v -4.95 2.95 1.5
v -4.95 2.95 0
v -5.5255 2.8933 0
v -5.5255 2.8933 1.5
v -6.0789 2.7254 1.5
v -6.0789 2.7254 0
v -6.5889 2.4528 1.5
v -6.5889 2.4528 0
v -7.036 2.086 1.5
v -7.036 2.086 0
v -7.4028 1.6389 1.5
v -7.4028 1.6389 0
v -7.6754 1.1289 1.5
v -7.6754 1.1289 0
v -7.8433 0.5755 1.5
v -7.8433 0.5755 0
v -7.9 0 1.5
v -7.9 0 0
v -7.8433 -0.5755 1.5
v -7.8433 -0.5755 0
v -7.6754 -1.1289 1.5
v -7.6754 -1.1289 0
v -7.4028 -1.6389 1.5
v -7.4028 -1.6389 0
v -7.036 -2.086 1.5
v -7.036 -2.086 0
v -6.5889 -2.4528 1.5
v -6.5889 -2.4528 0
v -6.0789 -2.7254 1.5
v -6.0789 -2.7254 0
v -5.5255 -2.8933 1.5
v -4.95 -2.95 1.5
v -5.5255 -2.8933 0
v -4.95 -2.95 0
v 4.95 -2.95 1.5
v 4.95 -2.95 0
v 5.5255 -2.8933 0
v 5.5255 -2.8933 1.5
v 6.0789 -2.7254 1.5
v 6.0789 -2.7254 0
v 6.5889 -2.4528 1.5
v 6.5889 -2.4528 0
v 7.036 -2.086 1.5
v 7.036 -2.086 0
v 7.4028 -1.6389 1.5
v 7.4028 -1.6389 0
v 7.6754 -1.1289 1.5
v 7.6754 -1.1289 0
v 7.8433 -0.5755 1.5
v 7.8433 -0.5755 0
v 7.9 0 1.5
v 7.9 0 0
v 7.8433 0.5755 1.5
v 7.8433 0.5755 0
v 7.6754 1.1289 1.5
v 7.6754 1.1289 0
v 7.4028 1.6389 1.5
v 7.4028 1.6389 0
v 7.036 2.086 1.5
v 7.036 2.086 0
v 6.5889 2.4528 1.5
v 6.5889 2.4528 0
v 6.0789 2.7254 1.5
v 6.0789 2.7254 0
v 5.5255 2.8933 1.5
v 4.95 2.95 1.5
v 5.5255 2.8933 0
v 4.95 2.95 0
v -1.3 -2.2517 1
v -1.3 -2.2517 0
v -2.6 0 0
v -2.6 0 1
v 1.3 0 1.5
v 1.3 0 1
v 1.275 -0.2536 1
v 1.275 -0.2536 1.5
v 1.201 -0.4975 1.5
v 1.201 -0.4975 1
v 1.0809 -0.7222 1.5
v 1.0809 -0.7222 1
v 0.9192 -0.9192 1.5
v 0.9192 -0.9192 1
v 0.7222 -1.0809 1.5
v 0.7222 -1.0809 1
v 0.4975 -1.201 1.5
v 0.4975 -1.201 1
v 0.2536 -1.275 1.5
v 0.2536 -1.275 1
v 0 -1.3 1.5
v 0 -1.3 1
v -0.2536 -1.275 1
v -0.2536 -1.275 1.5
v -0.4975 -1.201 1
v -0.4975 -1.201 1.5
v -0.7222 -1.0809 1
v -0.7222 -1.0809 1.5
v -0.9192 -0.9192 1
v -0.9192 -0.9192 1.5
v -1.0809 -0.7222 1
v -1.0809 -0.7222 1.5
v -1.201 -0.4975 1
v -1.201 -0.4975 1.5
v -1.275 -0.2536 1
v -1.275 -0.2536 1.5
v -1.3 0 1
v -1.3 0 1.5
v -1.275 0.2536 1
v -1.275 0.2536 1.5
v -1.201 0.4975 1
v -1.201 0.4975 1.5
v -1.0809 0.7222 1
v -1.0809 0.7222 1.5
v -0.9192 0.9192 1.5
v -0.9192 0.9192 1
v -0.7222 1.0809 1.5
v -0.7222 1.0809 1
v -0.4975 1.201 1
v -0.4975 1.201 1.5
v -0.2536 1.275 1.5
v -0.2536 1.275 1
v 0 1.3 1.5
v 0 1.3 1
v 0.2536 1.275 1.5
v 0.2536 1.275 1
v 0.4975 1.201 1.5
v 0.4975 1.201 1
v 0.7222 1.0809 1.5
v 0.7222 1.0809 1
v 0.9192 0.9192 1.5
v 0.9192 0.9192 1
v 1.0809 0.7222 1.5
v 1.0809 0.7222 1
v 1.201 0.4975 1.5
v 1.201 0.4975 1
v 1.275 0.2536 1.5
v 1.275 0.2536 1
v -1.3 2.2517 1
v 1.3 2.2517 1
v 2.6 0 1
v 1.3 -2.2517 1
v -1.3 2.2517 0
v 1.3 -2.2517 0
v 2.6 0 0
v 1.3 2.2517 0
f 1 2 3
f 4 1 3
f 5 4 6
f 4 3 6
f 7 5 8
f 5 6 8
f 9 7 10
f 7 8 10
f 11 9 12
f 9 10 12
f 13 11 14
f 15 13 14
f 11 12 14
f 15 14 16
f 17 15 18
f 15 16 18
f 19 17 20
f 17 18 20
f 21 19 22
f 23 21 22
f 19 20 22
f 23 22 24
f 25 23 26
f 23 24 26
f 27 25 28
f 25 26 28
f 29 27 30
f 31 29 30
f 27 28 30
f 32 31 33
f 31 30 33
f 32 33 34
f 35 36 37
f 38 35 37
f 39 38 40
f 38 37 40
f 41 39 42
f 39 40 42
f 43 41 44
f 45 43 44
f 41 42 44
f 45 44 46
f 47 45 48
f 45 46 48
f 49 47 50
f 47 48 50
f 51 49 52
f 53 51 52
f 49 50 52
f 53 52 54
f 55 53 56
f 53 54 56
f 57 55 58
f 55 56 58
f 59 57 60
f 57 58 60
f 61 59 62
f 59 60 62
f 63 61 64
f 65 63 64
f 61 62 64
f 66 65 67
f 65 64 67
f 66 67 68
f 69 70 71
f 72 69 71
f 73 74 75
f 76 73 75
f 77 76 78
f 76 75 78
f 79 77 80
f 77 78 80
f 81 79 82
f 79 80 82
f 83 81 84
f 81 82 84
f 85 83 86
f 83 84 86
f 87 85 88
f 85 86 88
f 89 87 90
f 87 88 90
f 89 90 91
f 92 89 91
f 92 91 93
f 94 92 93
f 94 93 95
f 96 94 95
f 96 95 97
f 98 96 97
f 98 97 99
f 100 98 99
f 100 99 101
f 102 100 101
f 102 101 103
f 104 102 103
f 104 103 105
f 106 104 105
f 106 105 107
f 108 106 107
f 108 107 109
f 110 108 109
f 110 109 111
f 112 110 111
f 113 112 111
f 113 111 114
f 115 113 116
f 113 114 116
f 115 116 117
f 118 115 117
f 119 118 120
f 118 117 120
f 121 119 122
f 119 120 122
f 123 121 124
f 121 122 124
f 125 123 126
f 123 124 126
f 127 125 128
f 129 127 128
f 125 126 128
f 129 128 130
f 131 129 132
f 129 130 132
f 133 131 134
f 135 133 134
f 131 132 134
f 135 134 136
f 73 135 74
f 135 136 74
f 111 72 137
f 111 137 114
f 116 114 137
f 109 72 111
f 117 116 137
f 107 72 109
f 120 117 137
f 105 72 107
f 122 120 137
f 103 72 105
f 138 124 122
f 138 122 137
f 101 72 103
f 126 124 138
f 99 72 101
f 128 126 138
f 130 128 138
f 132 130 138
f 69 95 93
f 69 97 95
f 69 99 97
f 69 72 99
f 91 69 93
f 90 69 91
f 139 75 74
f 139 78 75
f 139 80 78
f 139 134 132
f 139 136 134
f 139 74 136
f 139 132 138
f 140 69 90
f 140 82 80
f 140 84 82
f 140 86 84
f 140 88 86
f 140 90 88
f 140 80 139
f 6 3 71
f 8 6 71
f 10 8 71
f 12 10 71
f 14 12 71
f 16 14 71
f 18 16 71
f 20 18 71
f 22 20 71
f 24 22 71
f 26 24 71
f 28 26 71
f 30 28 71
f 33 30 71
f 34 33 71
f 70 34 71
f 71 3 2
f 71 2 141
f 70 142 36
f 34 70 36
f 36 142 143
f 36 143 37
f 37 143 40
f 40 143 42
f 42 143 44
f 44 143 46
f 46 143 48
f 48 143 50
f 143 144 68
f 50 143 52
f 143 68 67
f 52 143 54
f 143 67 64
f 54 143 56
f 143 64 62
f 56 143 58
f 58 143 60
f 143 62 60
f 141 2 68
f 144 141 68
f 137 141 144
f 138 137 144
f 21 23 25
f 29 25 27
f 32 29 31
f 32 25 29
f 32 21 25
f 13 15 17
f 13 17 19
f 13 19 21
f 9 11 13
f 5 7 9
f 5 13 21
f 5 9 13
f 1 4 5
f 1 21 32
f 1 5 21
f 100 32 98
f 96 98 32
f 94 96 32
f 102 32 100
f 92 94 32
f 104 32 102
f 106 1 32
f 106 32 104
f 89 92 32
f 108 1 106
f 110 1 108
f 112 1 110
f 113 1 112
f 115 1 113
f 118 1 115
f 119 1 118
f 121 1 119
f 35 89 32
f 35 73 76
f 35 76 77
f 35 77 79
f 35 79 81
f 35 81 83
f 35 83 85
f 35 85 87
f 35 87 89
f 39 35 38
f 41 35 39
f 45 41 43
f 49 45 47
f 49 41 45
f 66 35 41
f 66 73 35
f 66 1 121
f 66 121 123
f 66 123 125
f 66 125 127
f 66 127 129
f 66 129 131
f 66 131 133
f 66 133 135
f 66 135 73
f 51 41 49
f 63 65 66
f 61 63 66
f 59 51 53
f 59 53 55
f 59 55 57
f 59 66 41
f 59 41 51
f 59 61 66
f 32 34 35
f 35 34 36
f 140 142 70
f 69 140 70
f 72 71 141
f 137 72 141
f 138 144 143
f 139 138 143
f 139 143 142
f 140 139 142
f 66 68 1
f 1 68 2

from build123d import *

# Parameters (mm, degrees)
F1_DEPTH = 1.5
F3_DEPTH = 1
F4_R     = 1.3
F5_DEPTH = 25


with BuildPart() as f1:
    # F0 (on Top) → F1 (new body)
    with BuildSketch(Plane.XY):
        with BuildLine():
            Line((-2, 0), (0, 0))
            Line((0, 0), (2, 0))
            ThreePointArc((2, 0), (2.8640349955, 2.0859650045), (4.95, 2.95))
            Line((4.95, 2.95), (-4.95, 2.95))
            ThreePointArc((-4.95, 2.95), (-2.8640349955, 2.0859650045), (-2, 0))
        make_face()
        with BuildLine():
            Line((2, 0), (0, 0))
            Line((0, 0), (-2, 0))
            ThreePointArc((-2, 0), (-2.8640349955, -2.0859650045), (-4.95, -2.95))
            Line((-4.95, -2.95), (4.95, -2.95))
            ThreePointArc((4.95, -2.95), (2.8640349955, -2.0859650045), (2, 0))
        make_face()
        with BuildLine():
            ThreePointArc((4.95, 2.95), (2.8640349955, 2.0859650045), (2, 0))
            Line((2, 0), (4.95, 0))
            Line((4.95, 0), (4.95, 2.95))
        make_face()
        with BuildLine():
            Line((4.95, 0), (2, 0))
            ThreePointArc((2, 0), (2.8640349955, -2.0859650045), (4.95, -2.95))
            ThreePointArc((4.95, -2.95), (7.0359650045, -2.0859650045), (7.9, 0))
            ThreePointArc((7.9, 0), (7.0359650045, 2.0859650045), (4.95, 2.95))
            Line((4.95, 2.95), (4.95, 0))
        make_face()
        with BuildLine():
            ThreePointArc((-4.95, -2.95), (-2.8640349955, -2.0859650045), (-2, 0))
            ThreePointArc((-2, 0), (-2.8640349955, 2.0859650045), (-4.95, 2.95))
            ThreePointArc((-4.95, 2.95), (-7.9, 0), (-4.95, -2.95))
        make_face()
    extrude(amount=F1_DEPTH)

    # F2 (on face) → F3 (cut)
    with BuildSketch(Plane(origin=(0, 0, 0), x_dir=(1, 0, 0), z_dir=(0, 0, -1))):
        Polygon((1.3, -2.2516660498), (2.6, 0), (1.3, 2.2516660498), (-1.3, 2.2516660498), (-2.6, 0), (-1.3, -2.2516660498), align=None)
    extrude(amount=-F3_DEPTH, mode=Mode.SUBTRACT)

    # F4 (on face) → F5 (cut)
    with BuildSketch(Plane(origin=(0, 0, 1), x_dir=(1, 0, 0), z_dir=(0, 0, -1))):
        Circle(F4_R)
    extrude(amount=-F5_DEPTH, mode=Mode.SUBTRACT)


solid = f1.part
